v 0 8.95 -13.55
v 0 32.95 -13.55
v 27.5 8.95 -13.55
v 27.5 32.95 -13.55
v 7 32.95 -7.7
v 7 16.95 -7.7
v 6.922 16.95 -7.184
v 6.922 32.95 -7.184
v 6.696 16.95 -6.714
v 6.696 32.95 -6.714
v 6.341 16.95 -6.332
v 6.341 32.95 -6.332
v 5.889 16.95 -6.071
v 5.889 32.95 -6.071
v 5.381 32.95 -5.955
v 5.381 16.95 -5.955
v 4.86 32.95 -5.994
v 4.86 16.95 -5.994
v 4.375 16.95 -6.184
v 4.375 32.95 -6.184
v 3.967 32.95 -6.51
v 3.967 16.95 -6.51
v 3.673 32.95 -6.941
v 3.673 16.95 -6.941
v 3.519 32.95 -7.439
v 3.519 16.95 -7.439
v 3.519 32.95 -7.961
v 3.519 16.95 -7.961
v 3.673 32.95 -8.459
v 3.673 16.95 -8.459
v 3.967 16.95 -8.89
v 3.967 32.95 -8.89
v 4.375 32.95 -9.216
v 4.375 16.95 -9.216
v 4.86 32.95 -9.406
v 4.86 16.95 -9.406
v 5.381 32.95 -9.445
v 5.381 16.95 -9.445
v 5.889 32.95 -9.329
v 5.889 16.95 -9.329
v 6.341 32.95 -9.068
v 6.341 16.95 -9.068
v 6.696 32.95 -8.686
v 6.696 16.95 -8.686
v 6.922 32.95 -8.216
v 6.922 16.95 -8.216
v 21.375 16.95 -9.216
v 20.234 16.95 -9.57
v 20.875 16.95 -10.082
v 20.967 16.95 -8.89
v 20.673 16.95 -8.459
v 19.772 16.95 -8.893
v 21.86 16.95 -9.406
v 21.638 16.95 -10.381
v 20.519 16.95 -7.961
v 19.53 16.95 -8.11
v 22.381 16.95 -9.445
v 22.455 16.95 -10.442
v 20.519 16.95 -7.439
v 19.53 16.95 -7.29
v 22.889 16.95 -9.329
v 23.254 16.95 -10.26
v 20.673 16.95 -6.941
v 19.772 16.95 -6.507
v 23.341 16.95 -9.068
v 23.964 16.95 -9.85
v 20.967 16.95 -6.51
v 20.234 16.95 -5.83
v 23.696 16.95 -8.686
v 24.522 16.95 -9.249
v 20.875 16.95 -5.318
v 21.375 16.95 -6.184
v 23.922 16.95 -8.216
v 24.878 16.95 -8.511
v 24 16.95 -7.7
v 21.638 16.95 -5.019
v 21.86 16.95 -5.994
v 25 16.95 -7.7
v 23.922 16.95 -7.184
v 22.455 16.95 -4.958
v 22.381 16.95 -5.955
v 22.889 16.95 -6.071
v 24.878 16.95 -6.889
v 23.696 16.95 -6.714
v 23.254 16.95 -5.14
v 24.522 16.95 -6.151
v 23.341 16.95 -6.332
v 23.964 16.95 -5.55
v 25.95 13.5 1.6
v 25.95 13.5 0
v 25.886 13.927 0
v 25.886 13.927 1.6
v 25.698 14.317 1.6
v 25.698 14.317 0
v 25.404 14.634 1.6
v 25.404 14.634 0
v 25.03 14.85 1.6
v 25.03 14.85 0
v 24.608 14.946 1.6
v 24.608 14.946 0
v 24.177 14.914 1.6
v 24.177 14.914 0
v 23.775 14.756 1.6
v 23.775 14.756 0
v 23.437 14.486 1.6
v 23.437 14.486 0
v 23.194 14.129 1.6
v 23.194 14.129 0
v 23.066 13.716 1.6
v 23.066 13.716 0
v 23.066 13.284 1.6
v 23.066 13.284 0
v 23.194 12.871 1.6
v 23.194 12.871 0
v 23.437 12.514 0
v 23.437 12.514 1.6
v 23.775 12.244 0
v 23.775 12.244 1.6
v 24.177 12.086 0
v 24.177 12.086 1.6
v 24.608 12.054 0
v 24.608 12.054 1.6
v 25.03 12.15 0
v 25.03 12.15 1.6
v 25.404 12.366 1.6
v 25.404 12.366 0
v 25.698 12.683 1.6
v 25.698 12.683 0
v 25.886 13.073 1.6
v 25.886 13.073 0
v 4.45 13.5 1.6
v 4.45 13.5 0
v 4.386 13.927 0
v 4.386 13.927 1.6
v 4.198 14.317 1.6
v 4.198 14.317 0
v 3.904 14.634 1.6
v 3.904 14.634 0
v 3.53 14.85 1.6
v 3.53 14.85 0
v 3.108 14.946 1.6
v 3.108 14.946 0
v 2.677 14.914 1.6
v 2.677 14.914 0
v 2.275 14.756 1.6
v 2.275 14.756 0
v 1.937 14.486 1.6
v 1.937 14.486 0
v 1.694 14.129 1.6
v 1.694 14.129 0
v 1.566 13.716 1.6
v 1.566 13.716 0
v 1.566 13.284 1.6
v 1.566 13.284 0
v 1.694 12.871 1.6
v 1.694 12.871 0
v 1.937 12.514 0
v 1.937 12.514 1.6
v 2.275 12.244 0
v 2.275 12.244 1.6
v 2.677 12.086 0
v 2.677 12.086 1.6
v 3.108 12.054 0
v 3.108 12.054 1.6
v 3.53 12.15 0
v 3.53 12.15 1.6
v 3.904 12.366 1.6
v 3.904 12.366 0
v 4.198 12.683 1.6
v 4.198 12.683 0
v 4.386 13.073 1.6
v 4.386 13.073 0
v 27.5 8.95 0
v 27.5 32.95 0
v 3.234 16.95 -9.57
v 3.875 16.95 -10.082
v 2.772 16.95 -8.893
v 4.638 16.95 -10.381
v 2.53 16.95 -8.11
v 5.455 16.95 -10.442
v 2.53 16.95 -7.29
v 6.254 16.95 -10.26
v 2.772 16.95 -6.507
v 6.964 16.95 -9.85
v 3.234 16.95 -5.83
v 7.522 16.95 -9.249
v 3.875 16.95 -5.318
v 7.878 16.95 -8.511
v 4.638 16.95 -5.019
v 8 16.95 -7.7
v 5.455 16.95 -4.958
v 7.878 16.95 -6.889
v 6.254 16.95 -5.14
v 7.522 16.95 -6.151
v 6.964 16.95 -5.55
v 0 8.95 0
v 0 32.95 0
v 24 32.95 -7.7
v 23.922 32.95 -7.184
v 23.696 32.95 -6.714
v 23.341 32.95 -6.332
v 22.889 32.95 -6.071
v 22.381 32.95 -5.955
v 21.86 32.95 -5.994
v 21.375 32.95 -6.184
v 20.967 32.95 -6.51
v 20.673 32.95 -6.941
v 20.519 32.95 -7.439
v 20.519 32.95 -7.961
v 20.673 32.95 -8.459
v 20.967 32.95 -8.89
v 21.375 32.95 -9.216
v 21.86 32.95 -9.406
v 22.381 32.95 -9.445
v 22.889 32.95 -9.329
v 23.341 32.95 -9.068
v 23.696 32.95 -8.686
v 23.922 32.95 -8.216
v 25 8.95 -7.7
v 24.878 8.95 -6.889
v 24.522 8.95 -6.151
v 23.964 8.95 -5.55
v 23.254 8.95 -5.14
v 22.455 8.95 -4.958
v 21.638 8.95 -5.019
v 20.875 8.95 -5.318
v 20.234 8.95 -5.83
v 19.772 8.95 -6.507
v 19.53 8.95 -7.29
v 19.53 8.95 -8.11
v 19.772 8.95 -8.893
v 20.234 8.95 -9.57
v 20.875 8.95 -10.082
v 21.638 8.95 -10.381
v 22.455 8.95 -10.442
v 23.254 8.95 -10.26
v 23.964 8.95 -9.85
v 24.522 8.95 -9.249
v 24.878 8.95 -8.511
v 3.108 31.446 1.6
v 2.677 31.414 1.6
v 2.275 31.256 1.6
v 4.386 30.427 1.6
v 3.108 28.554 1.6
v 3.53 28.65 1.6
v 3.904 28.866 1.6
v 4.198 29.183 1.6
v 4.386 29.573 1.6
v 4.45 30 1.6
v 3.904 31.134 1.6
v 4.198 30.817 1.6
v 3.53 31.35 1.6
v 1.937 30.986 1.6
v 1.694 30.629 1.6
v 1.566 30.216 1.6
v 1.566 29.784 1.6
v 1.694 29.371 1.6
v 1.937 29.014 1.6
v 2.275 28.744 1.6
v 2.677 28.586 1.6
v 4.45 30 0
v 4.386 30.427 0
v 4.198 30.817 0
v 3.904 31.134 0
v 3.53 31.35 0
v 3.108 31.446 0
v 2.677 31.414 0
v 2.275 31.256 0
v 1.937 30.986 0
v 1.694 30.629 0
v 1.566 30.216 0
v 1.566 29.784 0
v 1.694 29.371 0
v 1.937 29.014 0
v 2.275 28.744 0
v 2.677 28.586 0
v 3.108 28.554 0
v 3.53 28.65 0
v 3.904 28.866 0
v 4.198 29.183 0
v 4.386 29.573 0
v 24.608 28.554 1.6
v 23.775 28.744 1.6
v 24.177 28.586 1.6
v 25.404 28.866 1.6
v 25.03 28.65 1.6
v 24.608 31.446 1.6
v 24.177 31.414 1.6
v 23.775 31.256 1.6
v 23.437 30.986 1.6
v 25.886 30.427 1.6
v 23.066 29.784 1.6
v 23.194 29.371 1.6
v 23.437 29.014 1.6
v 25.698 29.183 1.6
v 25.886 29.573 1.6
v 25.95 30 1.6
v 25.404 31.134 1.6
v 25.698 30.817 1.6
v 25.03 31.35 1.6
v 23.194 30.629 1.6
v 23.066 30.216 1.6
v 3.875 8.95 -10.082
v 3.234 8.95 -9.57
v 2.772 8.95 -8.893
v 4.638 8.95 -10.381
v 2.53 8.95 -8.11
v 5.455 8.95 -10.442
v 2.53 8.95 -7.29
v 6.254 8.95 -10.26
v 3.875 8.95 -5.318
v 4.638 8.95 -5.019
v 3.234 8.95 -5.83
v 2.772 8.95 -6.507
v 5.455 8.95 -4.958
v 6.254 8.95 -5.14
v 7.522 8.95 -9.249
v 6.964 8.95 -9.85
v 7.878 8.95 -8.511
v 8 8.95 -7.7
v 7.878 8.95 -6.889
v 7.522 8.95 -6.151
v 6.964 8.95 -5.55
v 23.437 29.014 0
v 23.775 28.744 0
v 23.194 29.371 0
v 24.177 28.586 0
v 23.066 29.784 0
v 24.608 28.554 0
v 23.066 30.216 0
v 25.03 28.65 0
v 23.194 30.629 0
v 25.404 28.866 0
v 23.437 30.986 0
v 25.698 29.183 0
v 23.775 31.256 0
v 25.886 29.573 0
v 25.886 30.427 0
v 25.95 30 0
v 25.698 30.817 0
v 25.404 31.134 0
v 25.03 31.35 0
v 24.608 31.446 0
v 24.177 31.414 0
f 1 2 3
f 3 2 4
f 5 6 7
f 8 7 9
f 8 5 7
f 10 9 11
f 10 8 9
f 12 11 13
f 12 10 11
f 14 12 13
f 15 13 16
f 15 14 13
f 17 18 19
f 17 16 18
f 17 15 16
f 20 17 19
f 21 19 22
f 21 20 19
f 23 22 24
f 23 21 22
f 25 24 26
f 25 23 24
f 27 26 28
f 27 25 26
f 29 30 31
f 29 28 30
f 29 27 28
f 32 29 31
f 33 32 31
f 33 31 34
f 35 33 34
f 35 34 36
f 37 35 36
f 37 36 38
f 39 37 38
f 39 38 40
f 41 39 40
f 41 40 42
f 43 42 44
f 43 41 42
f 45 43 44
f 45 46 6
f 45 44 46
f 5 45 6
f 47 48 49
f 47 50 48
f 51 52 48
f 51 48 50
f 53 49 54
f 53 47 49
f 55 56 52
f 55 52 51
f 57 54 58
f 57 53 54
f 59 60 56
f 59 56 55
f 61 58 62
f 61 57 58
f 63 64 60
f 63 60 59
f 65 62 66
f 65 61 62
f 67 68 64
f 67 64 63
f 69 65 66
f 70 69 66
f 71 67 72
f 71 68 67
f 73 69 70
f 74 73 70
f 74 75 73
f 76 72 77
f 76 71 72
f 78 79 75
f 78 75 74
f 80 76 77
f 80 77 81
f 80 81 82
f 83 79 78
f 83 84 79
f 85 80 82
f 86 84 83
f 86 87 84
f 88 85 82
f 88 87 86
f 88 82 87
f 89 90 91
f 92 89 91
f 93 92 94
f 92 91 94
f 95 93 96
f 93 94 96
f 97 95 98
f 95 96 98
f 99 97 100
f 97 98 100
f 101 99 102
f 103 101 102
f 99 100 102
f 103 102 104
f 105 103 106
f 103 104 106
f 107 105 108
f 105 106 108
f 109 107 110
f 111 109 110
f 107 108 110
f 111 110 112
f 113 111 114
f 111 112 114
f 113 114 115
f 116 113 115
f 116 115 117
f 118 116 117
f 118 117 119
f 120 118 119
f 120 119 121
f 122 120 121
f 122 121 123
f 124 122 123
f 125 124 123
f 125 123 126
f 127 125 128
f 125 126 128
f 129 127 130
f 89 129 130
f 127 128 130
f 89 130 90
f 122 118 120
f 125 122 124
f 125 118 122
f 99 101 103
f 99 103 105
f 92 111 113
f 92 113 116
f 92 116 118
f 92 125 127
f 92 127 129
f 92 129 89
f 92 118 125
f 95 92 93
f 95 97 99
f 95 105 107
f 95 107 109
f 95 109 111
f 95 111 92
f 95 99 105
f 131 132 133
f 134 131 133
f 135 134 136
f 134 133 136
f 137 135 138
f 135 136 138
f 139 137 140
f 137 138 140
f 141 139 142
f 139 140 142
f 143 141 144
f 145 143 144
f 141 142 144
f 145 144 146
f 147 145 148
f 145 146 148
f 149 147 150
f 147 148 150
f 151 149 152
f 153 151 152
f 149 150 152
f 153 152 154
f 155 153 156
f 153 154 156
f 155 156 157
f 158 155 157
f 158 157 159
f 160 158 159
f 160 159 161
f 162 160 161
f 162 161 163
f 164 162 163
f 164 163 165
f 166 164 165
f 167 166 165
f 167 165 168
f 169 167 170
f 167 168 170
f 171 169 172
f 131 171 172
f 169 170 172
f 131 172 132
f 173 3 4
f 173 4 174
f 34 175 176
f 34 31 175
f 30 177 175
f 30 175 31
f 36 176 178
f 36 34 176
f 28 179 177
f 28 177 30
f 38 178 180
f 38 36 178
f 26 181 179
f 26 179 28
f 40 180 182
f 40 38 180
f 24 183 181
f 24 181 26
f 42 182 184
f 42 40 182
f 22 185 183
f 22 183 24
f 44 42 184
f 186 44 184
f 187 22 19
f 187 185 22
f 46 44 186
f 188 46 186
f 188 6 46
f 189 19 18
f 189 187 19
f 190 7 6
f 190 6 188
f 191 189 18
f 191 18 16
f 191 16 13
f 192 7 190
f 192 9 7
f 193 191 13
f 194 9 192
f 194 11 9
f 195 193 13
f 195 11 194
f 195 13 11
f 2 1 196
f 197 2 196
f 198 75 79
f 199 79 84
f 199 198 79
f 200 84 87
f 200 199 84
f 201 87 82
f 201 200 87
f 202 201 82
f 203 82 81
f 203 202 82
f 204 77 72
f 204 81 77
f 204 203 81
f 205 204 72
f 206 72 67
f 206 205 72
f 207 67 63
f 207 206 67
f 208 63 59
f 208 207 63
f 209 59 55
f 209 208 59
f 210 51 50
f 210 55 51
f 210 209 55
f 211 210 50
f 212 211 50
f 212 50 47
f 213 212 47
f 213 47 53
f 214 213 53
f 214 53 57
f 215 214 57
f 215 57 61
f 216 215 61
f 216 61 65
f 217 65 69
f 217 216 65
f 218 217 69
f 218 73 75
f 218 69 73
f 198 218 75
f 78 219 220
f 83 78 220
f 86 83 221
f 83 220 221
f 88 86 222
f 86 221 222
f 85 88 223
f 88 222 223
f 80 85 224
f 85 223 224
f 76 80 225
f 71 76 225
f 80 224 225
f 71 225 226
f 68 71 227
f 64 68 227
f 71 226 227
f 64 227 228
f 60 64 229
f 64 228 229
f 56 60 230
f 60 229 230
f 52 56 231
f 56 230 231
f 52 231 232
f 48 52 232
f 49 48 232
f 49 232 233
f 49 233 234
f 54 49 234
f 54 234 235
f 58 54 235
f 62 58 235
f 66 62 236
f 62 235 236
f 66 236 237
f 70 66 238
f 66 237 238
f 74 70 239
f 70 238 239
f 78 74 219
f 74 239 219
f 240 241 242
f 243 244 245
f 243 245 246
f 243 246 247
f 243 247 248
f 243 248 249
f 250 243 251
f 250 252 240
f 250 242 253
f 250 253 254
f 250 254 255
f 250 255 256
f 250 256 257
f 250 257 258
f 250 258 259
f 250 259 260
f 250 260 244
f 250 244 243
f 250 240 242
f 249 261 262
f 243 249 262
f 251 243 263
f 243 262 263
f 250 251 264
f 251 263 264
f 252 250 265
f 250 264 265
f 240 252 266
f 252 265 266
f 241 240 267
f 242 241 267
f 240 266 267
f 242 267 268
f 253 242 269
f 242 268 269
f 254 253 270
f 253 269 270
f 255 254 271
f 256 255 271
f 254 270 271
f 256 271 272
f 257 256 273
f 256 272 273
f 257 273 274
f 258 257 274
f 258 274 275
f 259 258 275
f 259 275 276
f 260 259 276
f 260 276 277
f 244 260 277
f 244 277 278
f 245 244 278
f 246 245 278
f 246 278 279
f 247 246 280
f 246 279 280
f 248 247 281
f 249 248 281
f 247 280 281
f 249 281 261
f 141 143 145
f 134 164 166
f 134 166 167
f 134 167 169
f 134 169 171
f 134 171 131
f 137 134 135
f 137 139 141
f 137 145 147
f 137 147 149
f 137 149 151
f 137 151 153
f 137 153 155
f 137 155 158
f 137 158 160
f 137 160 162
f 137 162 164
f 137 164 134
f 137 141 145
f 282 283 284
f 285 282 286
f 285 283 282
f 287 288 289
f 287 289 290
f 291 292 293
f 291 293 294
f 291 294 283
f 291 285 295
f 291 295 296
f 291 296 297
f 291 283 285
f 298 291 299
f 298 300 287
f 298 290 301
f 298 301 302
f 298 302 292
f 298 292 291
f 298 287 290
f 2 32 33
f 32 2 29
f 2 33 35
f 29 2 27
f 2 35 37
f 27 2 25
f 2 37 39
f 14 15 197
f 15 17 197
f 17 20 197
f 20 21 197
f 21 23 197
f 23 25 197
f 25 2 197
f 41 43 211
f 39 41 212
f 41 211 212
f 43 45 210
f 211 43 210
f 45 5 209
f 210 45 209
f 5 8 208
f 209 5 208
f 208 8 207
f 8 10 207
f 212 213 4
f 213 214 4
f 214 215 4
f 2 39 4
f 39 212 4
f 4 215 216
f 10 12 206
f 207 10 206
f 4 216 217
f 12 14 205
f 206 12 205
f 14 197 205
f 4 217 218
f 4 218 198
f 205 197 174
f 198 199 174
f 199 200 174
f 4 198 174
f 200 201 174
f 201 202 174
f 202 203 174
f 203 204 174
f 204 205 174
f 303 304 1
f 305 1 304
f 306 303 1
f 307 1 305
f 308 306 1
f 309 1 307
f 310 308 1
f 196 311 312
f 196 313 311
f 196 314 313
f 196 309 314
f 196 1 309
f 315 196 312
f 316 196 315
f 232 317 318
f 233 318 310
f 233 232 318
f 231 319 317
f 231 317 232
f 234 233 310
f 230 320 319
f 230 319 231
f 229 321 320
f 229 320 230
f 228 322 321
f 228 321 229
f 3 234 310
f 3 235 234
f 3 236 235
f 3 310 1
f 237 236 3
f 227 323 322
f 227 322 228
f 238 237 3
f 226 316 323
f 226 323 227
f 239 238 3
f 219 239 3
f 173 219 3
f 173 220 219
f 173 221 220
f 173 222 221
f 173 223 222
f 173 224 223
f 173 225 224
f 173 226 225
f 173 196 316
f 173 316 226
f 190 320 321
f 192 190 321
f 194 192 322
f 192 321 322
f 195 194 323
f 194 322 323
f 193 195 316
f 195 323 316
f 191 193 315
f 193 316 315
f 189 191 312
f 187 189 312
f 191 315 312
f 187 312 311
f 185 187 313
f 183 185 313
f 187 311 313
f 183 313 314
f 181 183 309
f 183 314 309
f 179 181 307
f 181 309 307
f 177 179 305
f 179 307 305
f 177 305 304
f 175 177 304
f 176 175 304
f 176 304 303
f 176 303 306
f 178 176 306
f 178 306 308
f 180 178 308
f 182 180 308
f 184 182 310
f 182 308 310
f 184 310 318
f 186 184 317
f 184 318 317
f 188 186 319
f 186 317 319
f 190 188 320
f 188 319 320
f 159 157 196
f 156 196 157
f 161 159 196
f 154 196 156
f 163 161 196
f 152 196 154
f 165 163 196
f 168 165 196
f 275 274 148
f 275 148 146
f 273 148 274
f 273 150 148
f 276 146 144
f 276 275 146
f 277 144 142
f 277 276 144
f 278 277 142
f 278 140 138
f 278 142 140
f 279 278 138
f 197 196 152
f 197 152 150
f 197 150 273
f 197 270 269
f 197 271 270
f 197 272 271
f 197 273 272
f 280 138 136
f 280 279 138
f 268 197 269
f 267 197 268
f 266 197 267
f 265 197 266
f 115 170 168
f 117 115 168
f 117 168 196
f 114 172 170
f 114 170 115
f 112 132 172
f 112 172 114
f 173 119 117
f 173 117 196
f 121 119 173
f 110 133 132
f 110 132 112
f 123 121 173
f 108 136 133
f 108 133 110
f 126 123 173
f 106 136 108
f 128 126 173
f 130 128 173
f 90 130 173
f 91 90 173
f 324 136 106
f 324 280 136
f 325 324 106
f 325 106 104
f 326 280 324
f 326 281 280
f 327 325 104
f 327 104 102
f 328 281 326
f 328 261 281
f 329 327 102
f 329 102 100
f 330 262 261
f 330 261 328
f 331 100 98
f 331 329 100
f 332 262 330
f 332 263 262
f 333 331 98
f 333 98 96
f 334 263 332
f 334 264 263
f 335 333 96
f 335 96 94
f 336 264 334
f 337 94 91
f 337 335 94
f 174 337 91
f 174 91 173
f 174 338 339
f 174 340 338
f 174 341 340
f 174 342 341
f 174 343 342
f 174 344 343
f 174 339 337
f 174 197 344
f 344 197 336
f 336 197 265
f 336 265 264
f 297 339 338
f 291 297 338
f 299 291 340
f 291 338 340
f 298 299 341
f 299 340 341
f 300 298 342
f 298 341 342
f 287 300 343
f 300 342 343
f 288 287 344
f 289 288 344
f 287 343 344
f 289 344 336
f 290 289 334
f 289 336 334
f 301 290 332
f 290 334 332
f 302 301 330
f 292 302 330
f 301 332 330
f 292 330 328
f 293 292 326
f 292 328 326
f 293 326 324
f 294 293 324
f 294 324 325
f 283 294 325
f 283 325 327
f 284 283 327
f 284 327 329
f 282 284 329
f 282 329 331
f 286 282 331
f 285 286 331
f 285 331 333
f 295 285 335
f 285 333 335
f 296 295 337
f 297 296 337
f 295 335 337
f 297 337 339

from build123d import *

# Parameters (mm, degrees)
SKETCH015_W     = 27.500439
SKETCH015_H     = 13.55
SKETCH015_R     = 1.75
PAD007_DEPTH    = 24
SKETCH016_R     = 2.75
POCKET008_DEPTH = 8
SKETCH017_R     = 1.45
PAD008_DEPTH    = 1.6


with BuildPart() as part:
    # Sketch015 (on Face27 of Binder004) → Pad007 (new body)
    with BuildSketch(Plane.XZ.offset(-32.95)):
        with Locations((13.74978, -6.775)):
            Rectangle(SKETCH015_W, SKETCH015_H)
        with Locations((5.24978, -7.7)):
            Circle(SKETCH015_R, mode=Mode.SUBTRACT)
        with Locations((22.24978, -7.7)):
            Circle(SKETCH015_R, mode=Mode.SUBTRACT)
    extrude(amount=PAD007_DEPTH)

    # Sketch016 (on Face8 of Pad007) → Pocket008 (cut)
    with BuildSketch(Plane.XZ.offset(-8.95)):
        with Locations((5.24978, -7.7)):
            Circle(SKETCH016_R)
        with Locations((22.24978, -7.7)):
            Circle(SKETCH016_R)
    extrude(amount=-POCKET008_DEPTH, mode=Mode.SUBTRACT)

    # Sketch017 (on Face6 of Pocket008) → Pad008 (join)
    with BuildSketch(Plane.XY):
        with Locations((3, 13.5)):
            Circle(SKETCH017_R)
        with Locations((24.5, 13.5)):
            Circle(SKETCH017_R)
        with Locations((24.5, 30)):
            Circle(SKETCH017_R)
        with Locations((3, 30)):
            Circle(SKETCH017_R)
    extrude(amount=PAD008_DEPTH)


solid = part.part
